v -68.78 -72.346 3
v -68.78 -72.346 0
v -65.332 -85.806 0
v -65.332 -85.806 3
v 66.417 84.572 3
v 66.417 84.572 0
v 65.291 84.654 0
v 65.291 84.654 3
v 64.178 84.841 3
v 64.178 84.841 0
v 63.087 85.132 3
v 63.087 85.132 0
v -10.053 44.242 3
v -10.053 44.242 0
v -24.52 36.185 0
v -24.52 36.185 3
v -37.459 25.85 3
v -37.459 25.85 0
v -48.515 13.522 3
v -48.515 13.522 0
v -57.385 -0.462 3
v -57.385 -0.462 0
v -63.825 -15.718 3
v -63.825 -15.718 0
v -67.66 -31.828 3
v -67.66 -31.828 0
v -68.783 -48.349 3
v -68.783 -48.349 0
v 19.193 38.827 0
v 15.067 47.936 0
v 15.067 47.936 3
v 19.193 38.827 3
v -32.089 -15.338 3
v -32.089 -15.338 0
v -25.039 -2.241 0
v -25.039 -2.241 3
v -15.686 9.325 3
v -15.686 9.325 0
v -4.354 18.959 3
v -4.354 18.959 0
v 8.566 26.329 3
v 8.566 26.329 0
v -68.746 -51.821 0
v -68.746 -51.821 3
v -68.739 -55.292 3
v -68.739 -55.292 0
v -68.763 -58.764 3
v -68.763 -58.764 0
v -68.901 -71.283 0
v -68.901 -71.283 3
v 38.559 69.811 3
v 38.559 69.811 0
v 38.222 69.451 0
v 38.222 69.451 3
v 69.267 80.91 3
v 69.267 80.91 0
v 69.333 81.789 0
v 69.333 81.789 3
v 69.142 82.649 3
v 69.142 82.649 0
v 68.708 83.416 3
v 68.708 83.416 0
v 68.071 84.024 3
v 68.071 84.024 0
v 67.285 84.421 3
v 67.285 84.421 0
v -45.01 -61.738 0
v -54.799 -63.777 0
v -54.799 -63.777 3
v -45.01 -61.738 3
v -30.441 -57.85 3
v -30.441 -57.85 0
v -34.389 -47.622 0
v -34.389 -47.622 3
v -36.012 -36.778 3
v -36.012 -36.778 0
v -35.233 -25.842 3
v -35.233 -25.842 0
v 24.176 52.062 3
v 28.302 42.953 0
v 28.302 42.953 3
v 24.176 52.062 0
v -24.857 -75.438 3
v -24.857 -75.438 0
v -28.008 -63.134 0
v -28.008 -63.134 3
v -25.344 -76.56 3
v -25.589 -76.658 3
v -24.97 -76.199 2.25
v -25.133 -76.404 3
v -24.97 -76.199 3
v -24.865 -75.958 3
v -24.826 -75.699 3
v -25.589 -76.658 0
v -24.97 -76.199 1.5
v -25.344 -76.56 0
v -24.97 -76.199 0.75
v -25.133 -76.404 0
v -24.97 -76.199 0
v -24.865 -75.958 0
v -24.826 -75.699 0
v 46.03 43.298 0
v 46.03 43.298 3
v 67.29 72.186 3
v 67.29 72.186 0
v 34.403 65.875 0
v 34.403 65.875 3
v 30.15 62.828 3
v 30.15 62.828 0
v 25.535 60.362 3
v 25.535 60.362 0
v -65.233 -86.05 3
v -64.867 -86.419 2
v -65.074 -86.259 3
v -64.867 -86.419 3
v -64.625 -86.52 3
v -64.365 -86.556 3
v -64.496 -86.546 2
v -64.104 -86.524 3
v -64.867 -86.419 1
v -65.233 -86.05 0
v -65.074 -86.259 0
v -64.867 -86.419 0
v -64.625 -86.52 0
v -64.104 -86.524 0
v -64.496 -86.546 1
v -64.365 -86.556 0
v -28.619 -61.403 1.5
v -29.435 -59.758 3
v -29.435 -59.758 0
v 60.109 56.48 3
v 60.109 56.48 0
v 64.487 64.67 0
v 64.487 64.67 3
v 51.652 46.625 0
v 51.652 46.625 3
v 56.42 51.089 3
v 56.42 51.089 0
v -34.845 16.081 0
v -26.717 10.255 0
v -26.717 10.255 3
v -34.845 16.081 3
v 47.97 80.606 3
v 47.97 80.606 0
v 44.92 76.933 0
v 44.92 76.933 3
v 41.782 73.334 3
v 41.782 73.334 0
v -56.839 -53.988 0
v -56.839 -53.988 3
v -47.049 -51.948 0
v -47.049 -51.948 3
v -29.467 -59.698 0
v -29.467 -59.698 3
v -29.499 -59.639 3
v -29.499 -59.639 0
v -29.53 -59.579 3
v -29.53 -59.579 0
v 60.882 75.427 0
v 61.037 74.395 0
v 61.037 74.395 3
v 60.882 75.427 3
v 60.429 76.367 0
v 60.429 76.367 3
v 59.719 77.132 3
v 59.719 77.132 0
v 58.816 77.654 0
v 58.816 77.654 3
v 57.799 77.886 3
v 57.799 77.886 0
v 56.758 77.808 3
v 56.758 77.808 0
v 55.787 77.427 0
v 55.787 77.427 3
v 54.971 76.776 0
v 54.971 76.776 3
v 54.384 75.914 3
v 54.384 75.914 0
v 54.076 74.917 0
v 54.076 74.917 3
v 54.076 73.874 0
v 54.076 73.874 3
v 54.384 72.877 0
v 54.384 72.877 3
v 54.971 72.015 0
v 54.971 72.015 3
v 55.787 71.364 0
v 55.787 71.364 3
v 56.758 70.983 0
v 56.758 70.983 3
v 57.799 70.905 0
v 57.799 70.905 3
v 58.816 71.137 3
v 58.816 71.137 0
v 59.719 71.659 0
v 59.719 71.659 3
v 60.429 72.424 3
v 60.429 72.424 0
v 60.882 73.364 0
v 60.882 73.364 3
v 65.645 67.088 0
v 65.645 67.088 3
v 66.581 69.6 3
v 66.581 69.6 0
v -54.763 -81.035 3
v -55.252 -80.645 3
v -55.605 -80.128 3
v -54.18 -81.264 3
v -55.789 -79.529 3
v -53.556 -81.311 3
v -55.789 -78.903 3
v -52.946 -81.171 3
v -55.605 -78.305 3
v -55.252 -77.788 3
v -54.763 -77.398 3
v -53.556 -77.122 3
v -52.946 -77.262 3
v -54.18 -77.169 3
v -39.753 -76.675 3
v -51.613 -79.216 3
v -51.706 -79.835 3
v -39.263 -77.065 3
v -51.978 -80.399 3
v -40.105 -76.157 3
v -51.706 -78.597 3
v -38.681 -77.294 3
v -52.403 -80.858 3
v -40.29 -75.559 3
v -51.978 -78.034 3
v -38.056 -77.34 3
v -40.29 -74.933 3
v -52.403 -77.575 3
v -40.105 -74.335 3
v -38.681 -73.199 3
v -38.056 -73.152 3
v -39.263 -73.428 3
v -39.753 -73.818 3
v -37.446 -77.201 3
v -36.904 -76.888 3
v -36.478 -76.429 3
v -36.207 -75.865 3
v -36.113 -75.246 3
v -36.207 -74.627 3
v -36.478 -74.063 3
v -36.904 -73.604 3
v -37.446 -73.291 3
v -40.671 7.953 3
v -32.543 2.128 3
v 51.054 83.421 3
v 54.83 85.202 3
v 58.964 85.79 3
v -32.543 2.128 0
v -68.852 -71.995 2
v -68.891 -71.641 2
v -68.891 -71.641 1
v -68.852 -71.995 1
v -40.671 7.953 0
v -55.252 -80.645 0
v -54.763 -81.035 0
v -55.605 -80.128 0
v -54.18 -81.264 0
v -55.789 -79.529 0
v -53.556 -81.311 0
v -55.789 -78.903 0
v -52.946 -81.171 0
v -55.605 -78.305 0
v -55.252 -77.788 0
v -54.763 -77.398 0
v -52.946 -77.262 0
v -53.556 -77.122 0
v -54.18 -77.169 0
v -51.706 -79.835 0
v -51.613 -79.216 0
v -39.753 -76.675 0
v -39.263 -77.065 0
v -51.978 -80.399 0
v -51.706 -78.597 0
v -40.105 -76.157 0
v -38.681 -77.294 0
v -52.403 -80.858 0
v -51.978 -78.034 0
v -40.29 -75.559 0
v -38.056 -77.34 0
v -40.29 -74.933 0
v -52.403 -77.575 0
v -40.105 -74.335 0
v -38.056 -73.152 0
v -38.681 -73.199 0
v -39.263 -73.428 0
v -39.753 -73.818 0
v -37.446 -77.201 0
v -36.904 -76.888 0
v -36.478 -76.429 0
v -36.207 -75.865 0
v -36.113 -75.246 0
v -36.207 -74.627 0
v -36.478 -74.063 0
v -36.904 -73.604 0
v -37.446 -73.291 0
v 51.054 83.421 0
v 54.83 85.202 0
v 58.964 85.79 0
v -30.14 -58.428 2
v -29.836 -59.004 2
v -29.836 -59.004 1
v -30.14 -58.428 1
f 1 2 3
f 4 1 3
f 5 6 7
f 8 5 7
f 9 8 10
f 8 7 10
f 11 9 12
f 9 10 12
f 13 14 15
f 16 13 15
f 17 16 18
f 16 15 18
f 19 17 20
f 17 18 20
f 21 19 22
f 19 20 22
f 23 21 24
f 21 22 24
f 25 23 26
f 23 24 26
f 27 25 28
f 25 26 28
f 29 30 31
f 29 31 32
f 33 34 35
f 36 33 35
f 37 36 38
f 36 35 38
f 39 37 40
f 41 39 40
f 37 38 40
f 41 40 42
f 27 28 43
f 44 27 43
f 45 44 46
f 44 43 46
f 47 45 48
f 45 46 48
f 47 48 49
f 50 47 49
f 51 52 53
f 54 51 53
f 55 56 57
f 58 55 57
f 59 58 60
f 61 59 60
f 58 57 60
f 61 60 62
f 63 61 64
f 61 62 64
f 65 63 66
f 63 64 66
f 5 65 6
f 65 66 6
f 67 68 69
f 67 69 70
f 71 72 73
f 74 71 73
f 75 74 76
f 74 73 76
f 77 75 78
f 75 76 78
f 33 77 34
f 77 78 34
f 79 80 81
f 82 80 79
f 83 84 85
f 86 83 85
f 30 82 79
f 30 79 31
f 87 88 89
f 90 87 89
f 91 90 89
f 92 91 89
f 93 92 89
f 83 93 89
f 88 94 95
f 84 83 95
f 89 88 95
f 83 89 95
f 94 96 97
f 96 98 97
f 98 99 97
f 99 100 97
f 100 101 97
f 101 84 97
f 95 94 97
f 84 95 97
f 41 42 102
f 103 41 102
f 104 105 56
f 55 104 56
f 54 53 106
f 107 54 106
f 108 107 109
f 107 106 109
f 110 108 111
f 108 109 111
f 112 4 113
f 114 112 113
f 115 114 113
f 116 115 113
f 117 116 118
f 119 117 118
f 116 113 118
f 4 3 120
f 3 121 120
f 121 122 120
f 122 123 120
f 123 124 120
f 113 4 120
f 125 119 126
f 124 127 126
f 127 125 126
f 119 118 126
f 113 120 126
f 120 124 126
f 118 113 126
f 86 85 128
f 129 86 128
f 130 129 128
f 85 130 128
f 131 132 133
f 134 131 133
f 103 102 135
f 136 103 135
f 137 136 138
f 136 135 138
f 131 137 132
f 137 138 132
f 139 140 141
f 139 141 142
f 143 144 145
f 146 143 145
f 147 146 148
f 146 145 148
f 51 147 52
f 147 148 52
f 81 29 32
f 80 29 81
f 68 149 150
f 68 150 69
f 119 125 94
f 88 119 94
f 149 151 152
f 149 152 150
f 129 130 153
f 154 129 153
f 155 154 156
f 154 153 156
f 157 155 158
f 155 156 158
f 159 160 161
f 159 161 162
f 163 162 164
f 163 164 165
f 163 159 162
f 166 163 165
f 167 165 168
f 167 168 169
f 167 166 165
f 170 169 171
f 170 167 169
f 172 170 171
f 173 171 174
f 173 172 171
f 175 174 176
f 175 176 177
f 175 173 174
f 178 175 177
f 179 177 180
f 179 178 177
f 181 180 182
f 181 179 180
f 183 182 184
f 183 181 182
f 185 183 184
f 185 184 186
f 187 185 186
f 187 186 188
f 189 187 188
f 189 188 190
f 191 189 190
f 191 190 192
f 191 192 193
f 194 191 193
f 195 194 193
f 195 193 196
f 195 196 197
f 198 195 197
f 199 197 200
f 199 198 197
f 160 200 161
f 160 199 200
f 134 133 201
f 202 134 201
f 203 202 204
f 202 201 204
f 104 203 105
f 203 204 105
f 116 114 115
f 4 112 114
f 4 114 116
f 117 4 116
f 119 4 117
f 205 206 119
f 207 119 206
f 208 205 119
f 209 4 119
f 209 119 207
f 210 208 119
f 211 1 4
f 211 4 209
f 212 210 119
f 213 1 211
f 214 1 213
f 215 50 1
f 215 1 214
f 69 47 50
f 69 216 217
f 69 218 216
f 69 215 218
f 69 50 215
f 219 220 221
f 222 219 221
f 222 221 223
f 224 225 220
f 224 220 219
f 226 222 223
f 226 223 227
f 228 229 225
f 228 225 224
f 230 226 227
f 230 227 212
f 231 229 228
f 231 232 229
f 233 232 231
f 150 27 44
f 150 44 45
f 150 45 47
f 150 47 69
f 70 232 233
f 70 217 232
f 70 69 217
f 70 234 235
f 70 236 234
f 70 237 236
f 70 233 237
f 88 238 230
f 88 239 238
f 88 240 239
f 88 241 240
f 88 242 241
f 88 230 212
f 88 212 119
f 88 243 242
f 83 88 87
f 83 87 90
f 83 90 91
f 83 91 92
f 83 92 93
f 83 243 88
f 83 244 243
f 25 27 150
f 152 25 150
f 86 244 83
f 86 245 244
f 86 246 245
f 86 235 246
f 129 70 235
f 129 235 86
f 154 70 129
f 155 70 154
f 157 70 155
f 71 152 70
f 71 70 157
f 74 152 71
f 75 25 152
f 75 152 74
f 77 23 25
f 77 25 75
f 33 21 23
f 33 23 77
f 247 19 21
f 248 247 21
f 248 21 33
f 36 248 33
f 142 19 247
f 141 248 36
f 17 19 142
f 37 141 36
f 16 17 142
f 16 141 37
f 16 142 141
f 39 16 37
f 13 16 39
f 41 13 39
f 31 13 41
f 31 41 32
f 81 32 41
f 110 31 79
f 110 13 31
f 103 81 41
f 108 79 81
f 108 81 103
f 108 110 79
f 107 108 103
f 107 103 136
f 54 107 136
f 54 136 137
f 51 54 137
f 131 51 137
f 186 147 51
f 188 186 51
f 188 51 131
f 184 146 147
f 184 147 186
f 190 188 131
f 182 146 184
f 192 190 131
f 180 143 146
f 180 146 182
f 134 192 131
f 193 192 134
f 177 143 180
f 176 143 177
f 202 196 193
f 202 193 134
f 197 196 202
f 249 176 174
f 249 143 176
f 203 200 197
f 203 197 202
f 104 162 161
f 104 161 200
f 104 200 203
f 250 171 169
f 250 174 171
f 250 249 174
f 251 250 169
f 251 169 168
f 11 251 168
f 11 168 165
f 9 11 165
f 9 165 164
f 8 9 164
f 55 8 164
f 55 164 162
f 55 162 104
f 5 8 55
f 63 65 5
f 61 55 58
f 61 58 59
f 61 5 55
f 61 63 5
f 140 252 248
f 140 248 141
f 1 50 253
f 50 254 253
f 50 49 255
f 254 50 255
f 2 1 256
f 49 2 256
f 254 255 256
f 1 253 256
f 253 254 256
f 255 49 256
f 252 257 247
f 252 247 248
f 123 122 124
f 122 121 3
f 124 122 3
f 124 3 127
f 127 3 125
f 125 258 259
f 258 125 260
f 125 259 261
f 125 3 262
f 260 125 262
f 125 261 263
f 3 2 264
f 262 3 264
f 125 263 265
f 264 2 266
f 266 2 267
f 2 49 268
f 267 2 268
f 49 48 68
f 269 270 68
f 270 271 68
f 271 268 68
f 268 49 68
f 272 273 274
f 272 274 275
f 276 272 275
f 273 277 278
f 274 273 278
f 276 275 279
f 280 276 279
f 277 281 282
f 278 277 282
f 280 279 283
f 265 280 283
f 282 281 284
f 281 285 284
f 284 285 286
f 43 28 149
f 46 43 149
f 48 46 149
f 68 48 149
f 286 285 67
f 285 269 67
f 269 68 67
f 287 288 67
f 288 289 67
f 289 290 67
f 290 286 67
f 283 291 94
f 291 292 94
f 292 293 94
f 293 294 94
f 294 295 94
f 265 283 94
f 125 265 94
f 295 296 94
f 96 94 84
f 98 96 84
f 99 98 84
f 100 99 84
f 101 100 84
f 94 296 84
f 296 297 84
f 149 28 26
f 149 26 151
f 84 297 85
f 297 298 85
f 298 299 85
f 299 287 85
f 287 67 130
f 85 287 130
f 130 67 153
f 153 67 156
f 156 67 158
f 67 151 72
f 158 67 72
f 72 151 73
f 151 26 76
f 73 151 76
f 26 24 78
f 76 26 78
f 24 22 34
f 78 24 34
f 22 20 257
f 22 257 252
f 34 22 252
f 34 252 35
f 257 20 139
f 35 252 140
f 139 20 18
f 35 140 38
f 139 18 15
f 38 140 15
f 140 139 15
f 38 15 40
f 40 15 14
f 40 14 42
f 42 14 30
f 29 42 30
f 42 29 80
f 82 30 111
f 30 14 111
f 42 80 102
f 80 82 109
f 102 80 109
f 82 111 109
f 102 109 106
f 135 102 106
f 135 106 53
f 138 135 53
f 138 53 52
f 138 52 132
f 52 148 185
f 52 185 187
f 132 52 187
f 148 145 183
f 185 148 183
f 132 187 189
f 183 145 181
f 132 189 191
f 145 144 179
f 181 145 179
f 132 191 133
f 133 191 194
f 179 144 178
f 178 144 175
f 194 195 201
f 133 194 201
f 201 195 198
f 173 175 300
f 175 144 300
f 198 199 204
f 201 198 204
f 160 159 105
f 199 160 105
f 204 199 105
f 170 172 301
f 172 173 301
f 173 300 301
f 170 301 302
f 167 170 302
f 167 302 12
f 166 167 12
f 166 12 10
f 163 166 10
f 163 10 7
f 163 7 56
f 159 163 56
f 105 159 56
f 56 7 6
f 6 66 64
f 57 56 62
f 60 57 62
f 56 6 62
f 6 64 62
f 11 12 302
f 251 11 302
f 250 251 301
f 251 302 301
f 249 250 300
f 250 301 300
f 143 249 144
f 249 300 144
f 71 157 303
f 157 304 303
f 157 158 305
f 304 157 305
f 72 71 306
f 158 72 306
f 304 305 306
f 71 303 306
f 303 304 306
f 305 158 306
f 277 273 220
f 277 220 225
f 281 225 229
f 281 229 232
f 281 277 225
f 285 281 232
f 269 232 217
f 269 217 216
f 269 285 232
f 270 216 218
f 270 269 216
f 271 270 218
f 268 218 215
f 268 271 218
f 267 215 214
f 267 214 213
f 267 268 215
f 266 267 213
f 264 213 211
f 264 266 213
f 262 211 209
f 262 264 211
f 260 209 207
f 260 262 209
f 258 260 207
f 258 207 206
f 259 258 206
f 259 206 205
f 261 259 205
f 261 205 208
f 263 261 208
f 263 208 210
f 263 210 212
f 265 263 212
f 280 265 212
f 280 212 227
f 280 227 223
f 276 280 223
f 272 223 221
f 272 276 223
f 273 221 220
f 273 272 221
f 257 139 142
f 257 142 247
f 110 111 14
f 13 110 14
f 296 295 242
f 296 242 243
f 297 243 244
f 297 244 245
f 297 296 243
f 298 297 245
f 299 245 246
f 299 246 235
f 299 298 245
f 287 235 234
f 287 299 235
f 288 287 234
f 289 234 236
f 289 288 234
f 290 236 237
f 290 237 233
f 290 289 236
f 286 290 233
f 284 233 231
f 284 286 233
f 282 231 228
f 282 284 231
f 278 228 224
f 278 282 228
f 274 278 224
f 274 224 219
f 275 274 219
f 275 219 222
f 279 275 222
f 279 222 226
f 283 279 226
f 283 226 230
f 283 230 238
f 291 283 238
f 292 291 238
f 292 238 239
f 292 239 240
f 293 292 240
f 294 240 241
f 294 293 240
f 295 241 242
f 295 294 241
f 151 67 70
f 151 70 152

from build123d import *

# Parameters (mm, degrees)
SKETCH_1_R      = 2.1
SKETCH_1_R_2    = 3.5
EXTRUDE_2_DEPTH = 3


with BuildPart() as part:
    # 草图1 → 凸台-拉伸2 (new body)
    with BuildSketch(Plane.XY):
        with BuildLine():
            Line((60.108529062, 56.480111122), (64.487335669, 64.669737676))
            ThreePointArc((64.487335669, 64.669737676), (66.140949497, 68.333634007), (67.289887488, 72.185713512))
            Line((67.289887488, 72.185713512), (69.266744251, 80.910498231))
            ThreePointArc((69.266744251, 80.910498231), (68.708488356, 83.415866549), (66.417026795, 84.572466723))
            ThreePointArc((66.417026795, 84.572466723), (64.732022053, 84.734670443), (63.08660729, 85.132365403))
            ThreePointArc((63.08660729, 85.132365403), (54.829995833, 85.201744676), (47.970271321, 80.606026467))
            ThreePointArc((47.970271321, 80.606026467), (43.361470665, 75.124097666), (38.559351744, 69.810695675))
            Line((38.559351744, 69.810695675), (38.222405654, 69.45103511))
            ThreePointArc((38.222405654, 69.45103511), (32.32628292, 64.281621274), (25.53494992, 60.361812759))
            Line((25.53494992, 60.361812759), (-10.053418577, 44.242472458))
            ThreePointArc((-10.053418577, 44.242472458), (-53.239902616, 6.713533173), (-68.783230916, -48.349145956))
            ThreePointArc((-68.783230916, -48.349145956), (-68.739018938, -53.556339201), (-68.762598868, -58.763666747))
            Line((-68.762598868, -58.763666747), (-68.900791413, -71.283477095))
            add(Edge.make_bspline(
                [(-68.900791413, -71.283477095), (-68.904755434, -71.642604913), (-68.869353076, -71.99725933), (-68.78007525, -72.345791606)],
                knots=[0, 0, 0, 0, 1, 1, 1, 1], degree=3))
            Line((-68.78007525, -72.345791606), (-65.332232289, -85.805847824))
            add(Edge.make_bspline(
                [(-65.332232289, -85.805847824), (-65.266290033, -86.063280218), (-65.094030982, -86.28740051), (-64.753434981, -86.484972432), (-64.626638003, -86.528436786), (-64.365301889, -86.564062669), (-64.232742572, -86.556495641), (-64.104070986, -86.52353594)],
                knots=[0, 0, 0, 0, 0.5, 0.5, 0.75, 0.75, 1, 1, 1, 1], degree=3))
            Line((-64.104070986, -86.52353594), (-25.588649762, -76.657668977))
            add(Edge.make_bspline(
                [(-25.588649762, -76.657668977), (-25.460001904, -76.624715354), (-25.338581913, -76.566631903), (-25.128149885, -76.410642035), (-25.037269873, -76.310980591), (-24.901787172, -76.086443416), (-24.85605053, -75.960103889), (-24.81724118, -75.699526051), (-24.823808393, -75.566599434), (-24.856772712, -75.437909819)],
                knots=[0, 0, 0, 0, 0.25, 0.25, 0.5, 0.5, 0.75, 0.75, 1, 1, 1, 1], degree=3))
            Line((-24.856772712, -75.437909819), (-28.008350918, -63.134443476))
            add(Edge.make_bspline(
                [(-28.008350918, -63.134443476), (-28.161648764, -62.535983036), (-28.3702854, -61.960912506), (-28.867938385, -60.844745341), (-29.148955026, -60.300267489), (-29.435424134, -59.758094219)],
                knots=[0, 0, 0, 0, 0.5, 0.5, 1, 1, 1, 1], degree=3))
            ThreePointArc((-29.435424134, -59.758094219), (-29.482770246, -59.668648597), (-29.530246194, -59.579271823))
            add(Edge.make_bspline(
                [(-29.530246194, -59.579271823), (-29.836233344, -59.00420985), (-30.141588994, -58.428815067), (-30.441350493, -57.850472079)],
                knots=[0, 0, 0, 0, 1, 1, 1, 1], degree=3))
            ThreePointArc((-30.441350493, -57.850472079), (-36.012355657, -36.778090759), (-32.088860612, -15.337765675))
            ThreePointArc((-32.088860612, -15.337765675), (-15.685769973, 9.324890383), (8.566391241, 26.329027021))
            Line((8.566391241, 26.329027021), (46.030399371, 43.297916621))
            ThreePointArc((46.030399371, 43.297916621), (54.157658777, 48.726859562), (60.108529062, 56.480111122))
        make_face()
        with Locations((-53.71278904, -79.216483104)):
            Circle(SKETCH_1_R, mode=Mode.SUBTRACT)
        with Locations((-38.213210847, -75.246209079)):
            Circle(SKETCH_1_R, mode=Mode.SUBTRACT)
        with Locations((57.537099808, 74.395494602)):
            Circle(SKETCH_1_R_2, mode=Mode.SUBTRACT)
        Polygon((-56.839024332, -53.987565244), (-54.799481791, -63.777369442), (-45.009677593, -61.737826901), (-47.049220135, -51.948022703), align=None, mode=Mode.SUBTRACT)
        Polygon((-40.670972246, 7.953488017), (-32.543257763, 2.12766127), (-26.717431016, 10.255375753), (-34.845145499, 16.0812025), align=None, mode=Mode.SUBTRACT)
        Polygon((15.066954043, 47.935891978), (19.192847886, 38.826720775), (28.302019088, 42.952614619), (24.176125245, 52.061785821), align=None, mode=Mode.SUBTRACT)
    extrude(amount=EXTRUDE_2_DEPTH)


solid = part.part
